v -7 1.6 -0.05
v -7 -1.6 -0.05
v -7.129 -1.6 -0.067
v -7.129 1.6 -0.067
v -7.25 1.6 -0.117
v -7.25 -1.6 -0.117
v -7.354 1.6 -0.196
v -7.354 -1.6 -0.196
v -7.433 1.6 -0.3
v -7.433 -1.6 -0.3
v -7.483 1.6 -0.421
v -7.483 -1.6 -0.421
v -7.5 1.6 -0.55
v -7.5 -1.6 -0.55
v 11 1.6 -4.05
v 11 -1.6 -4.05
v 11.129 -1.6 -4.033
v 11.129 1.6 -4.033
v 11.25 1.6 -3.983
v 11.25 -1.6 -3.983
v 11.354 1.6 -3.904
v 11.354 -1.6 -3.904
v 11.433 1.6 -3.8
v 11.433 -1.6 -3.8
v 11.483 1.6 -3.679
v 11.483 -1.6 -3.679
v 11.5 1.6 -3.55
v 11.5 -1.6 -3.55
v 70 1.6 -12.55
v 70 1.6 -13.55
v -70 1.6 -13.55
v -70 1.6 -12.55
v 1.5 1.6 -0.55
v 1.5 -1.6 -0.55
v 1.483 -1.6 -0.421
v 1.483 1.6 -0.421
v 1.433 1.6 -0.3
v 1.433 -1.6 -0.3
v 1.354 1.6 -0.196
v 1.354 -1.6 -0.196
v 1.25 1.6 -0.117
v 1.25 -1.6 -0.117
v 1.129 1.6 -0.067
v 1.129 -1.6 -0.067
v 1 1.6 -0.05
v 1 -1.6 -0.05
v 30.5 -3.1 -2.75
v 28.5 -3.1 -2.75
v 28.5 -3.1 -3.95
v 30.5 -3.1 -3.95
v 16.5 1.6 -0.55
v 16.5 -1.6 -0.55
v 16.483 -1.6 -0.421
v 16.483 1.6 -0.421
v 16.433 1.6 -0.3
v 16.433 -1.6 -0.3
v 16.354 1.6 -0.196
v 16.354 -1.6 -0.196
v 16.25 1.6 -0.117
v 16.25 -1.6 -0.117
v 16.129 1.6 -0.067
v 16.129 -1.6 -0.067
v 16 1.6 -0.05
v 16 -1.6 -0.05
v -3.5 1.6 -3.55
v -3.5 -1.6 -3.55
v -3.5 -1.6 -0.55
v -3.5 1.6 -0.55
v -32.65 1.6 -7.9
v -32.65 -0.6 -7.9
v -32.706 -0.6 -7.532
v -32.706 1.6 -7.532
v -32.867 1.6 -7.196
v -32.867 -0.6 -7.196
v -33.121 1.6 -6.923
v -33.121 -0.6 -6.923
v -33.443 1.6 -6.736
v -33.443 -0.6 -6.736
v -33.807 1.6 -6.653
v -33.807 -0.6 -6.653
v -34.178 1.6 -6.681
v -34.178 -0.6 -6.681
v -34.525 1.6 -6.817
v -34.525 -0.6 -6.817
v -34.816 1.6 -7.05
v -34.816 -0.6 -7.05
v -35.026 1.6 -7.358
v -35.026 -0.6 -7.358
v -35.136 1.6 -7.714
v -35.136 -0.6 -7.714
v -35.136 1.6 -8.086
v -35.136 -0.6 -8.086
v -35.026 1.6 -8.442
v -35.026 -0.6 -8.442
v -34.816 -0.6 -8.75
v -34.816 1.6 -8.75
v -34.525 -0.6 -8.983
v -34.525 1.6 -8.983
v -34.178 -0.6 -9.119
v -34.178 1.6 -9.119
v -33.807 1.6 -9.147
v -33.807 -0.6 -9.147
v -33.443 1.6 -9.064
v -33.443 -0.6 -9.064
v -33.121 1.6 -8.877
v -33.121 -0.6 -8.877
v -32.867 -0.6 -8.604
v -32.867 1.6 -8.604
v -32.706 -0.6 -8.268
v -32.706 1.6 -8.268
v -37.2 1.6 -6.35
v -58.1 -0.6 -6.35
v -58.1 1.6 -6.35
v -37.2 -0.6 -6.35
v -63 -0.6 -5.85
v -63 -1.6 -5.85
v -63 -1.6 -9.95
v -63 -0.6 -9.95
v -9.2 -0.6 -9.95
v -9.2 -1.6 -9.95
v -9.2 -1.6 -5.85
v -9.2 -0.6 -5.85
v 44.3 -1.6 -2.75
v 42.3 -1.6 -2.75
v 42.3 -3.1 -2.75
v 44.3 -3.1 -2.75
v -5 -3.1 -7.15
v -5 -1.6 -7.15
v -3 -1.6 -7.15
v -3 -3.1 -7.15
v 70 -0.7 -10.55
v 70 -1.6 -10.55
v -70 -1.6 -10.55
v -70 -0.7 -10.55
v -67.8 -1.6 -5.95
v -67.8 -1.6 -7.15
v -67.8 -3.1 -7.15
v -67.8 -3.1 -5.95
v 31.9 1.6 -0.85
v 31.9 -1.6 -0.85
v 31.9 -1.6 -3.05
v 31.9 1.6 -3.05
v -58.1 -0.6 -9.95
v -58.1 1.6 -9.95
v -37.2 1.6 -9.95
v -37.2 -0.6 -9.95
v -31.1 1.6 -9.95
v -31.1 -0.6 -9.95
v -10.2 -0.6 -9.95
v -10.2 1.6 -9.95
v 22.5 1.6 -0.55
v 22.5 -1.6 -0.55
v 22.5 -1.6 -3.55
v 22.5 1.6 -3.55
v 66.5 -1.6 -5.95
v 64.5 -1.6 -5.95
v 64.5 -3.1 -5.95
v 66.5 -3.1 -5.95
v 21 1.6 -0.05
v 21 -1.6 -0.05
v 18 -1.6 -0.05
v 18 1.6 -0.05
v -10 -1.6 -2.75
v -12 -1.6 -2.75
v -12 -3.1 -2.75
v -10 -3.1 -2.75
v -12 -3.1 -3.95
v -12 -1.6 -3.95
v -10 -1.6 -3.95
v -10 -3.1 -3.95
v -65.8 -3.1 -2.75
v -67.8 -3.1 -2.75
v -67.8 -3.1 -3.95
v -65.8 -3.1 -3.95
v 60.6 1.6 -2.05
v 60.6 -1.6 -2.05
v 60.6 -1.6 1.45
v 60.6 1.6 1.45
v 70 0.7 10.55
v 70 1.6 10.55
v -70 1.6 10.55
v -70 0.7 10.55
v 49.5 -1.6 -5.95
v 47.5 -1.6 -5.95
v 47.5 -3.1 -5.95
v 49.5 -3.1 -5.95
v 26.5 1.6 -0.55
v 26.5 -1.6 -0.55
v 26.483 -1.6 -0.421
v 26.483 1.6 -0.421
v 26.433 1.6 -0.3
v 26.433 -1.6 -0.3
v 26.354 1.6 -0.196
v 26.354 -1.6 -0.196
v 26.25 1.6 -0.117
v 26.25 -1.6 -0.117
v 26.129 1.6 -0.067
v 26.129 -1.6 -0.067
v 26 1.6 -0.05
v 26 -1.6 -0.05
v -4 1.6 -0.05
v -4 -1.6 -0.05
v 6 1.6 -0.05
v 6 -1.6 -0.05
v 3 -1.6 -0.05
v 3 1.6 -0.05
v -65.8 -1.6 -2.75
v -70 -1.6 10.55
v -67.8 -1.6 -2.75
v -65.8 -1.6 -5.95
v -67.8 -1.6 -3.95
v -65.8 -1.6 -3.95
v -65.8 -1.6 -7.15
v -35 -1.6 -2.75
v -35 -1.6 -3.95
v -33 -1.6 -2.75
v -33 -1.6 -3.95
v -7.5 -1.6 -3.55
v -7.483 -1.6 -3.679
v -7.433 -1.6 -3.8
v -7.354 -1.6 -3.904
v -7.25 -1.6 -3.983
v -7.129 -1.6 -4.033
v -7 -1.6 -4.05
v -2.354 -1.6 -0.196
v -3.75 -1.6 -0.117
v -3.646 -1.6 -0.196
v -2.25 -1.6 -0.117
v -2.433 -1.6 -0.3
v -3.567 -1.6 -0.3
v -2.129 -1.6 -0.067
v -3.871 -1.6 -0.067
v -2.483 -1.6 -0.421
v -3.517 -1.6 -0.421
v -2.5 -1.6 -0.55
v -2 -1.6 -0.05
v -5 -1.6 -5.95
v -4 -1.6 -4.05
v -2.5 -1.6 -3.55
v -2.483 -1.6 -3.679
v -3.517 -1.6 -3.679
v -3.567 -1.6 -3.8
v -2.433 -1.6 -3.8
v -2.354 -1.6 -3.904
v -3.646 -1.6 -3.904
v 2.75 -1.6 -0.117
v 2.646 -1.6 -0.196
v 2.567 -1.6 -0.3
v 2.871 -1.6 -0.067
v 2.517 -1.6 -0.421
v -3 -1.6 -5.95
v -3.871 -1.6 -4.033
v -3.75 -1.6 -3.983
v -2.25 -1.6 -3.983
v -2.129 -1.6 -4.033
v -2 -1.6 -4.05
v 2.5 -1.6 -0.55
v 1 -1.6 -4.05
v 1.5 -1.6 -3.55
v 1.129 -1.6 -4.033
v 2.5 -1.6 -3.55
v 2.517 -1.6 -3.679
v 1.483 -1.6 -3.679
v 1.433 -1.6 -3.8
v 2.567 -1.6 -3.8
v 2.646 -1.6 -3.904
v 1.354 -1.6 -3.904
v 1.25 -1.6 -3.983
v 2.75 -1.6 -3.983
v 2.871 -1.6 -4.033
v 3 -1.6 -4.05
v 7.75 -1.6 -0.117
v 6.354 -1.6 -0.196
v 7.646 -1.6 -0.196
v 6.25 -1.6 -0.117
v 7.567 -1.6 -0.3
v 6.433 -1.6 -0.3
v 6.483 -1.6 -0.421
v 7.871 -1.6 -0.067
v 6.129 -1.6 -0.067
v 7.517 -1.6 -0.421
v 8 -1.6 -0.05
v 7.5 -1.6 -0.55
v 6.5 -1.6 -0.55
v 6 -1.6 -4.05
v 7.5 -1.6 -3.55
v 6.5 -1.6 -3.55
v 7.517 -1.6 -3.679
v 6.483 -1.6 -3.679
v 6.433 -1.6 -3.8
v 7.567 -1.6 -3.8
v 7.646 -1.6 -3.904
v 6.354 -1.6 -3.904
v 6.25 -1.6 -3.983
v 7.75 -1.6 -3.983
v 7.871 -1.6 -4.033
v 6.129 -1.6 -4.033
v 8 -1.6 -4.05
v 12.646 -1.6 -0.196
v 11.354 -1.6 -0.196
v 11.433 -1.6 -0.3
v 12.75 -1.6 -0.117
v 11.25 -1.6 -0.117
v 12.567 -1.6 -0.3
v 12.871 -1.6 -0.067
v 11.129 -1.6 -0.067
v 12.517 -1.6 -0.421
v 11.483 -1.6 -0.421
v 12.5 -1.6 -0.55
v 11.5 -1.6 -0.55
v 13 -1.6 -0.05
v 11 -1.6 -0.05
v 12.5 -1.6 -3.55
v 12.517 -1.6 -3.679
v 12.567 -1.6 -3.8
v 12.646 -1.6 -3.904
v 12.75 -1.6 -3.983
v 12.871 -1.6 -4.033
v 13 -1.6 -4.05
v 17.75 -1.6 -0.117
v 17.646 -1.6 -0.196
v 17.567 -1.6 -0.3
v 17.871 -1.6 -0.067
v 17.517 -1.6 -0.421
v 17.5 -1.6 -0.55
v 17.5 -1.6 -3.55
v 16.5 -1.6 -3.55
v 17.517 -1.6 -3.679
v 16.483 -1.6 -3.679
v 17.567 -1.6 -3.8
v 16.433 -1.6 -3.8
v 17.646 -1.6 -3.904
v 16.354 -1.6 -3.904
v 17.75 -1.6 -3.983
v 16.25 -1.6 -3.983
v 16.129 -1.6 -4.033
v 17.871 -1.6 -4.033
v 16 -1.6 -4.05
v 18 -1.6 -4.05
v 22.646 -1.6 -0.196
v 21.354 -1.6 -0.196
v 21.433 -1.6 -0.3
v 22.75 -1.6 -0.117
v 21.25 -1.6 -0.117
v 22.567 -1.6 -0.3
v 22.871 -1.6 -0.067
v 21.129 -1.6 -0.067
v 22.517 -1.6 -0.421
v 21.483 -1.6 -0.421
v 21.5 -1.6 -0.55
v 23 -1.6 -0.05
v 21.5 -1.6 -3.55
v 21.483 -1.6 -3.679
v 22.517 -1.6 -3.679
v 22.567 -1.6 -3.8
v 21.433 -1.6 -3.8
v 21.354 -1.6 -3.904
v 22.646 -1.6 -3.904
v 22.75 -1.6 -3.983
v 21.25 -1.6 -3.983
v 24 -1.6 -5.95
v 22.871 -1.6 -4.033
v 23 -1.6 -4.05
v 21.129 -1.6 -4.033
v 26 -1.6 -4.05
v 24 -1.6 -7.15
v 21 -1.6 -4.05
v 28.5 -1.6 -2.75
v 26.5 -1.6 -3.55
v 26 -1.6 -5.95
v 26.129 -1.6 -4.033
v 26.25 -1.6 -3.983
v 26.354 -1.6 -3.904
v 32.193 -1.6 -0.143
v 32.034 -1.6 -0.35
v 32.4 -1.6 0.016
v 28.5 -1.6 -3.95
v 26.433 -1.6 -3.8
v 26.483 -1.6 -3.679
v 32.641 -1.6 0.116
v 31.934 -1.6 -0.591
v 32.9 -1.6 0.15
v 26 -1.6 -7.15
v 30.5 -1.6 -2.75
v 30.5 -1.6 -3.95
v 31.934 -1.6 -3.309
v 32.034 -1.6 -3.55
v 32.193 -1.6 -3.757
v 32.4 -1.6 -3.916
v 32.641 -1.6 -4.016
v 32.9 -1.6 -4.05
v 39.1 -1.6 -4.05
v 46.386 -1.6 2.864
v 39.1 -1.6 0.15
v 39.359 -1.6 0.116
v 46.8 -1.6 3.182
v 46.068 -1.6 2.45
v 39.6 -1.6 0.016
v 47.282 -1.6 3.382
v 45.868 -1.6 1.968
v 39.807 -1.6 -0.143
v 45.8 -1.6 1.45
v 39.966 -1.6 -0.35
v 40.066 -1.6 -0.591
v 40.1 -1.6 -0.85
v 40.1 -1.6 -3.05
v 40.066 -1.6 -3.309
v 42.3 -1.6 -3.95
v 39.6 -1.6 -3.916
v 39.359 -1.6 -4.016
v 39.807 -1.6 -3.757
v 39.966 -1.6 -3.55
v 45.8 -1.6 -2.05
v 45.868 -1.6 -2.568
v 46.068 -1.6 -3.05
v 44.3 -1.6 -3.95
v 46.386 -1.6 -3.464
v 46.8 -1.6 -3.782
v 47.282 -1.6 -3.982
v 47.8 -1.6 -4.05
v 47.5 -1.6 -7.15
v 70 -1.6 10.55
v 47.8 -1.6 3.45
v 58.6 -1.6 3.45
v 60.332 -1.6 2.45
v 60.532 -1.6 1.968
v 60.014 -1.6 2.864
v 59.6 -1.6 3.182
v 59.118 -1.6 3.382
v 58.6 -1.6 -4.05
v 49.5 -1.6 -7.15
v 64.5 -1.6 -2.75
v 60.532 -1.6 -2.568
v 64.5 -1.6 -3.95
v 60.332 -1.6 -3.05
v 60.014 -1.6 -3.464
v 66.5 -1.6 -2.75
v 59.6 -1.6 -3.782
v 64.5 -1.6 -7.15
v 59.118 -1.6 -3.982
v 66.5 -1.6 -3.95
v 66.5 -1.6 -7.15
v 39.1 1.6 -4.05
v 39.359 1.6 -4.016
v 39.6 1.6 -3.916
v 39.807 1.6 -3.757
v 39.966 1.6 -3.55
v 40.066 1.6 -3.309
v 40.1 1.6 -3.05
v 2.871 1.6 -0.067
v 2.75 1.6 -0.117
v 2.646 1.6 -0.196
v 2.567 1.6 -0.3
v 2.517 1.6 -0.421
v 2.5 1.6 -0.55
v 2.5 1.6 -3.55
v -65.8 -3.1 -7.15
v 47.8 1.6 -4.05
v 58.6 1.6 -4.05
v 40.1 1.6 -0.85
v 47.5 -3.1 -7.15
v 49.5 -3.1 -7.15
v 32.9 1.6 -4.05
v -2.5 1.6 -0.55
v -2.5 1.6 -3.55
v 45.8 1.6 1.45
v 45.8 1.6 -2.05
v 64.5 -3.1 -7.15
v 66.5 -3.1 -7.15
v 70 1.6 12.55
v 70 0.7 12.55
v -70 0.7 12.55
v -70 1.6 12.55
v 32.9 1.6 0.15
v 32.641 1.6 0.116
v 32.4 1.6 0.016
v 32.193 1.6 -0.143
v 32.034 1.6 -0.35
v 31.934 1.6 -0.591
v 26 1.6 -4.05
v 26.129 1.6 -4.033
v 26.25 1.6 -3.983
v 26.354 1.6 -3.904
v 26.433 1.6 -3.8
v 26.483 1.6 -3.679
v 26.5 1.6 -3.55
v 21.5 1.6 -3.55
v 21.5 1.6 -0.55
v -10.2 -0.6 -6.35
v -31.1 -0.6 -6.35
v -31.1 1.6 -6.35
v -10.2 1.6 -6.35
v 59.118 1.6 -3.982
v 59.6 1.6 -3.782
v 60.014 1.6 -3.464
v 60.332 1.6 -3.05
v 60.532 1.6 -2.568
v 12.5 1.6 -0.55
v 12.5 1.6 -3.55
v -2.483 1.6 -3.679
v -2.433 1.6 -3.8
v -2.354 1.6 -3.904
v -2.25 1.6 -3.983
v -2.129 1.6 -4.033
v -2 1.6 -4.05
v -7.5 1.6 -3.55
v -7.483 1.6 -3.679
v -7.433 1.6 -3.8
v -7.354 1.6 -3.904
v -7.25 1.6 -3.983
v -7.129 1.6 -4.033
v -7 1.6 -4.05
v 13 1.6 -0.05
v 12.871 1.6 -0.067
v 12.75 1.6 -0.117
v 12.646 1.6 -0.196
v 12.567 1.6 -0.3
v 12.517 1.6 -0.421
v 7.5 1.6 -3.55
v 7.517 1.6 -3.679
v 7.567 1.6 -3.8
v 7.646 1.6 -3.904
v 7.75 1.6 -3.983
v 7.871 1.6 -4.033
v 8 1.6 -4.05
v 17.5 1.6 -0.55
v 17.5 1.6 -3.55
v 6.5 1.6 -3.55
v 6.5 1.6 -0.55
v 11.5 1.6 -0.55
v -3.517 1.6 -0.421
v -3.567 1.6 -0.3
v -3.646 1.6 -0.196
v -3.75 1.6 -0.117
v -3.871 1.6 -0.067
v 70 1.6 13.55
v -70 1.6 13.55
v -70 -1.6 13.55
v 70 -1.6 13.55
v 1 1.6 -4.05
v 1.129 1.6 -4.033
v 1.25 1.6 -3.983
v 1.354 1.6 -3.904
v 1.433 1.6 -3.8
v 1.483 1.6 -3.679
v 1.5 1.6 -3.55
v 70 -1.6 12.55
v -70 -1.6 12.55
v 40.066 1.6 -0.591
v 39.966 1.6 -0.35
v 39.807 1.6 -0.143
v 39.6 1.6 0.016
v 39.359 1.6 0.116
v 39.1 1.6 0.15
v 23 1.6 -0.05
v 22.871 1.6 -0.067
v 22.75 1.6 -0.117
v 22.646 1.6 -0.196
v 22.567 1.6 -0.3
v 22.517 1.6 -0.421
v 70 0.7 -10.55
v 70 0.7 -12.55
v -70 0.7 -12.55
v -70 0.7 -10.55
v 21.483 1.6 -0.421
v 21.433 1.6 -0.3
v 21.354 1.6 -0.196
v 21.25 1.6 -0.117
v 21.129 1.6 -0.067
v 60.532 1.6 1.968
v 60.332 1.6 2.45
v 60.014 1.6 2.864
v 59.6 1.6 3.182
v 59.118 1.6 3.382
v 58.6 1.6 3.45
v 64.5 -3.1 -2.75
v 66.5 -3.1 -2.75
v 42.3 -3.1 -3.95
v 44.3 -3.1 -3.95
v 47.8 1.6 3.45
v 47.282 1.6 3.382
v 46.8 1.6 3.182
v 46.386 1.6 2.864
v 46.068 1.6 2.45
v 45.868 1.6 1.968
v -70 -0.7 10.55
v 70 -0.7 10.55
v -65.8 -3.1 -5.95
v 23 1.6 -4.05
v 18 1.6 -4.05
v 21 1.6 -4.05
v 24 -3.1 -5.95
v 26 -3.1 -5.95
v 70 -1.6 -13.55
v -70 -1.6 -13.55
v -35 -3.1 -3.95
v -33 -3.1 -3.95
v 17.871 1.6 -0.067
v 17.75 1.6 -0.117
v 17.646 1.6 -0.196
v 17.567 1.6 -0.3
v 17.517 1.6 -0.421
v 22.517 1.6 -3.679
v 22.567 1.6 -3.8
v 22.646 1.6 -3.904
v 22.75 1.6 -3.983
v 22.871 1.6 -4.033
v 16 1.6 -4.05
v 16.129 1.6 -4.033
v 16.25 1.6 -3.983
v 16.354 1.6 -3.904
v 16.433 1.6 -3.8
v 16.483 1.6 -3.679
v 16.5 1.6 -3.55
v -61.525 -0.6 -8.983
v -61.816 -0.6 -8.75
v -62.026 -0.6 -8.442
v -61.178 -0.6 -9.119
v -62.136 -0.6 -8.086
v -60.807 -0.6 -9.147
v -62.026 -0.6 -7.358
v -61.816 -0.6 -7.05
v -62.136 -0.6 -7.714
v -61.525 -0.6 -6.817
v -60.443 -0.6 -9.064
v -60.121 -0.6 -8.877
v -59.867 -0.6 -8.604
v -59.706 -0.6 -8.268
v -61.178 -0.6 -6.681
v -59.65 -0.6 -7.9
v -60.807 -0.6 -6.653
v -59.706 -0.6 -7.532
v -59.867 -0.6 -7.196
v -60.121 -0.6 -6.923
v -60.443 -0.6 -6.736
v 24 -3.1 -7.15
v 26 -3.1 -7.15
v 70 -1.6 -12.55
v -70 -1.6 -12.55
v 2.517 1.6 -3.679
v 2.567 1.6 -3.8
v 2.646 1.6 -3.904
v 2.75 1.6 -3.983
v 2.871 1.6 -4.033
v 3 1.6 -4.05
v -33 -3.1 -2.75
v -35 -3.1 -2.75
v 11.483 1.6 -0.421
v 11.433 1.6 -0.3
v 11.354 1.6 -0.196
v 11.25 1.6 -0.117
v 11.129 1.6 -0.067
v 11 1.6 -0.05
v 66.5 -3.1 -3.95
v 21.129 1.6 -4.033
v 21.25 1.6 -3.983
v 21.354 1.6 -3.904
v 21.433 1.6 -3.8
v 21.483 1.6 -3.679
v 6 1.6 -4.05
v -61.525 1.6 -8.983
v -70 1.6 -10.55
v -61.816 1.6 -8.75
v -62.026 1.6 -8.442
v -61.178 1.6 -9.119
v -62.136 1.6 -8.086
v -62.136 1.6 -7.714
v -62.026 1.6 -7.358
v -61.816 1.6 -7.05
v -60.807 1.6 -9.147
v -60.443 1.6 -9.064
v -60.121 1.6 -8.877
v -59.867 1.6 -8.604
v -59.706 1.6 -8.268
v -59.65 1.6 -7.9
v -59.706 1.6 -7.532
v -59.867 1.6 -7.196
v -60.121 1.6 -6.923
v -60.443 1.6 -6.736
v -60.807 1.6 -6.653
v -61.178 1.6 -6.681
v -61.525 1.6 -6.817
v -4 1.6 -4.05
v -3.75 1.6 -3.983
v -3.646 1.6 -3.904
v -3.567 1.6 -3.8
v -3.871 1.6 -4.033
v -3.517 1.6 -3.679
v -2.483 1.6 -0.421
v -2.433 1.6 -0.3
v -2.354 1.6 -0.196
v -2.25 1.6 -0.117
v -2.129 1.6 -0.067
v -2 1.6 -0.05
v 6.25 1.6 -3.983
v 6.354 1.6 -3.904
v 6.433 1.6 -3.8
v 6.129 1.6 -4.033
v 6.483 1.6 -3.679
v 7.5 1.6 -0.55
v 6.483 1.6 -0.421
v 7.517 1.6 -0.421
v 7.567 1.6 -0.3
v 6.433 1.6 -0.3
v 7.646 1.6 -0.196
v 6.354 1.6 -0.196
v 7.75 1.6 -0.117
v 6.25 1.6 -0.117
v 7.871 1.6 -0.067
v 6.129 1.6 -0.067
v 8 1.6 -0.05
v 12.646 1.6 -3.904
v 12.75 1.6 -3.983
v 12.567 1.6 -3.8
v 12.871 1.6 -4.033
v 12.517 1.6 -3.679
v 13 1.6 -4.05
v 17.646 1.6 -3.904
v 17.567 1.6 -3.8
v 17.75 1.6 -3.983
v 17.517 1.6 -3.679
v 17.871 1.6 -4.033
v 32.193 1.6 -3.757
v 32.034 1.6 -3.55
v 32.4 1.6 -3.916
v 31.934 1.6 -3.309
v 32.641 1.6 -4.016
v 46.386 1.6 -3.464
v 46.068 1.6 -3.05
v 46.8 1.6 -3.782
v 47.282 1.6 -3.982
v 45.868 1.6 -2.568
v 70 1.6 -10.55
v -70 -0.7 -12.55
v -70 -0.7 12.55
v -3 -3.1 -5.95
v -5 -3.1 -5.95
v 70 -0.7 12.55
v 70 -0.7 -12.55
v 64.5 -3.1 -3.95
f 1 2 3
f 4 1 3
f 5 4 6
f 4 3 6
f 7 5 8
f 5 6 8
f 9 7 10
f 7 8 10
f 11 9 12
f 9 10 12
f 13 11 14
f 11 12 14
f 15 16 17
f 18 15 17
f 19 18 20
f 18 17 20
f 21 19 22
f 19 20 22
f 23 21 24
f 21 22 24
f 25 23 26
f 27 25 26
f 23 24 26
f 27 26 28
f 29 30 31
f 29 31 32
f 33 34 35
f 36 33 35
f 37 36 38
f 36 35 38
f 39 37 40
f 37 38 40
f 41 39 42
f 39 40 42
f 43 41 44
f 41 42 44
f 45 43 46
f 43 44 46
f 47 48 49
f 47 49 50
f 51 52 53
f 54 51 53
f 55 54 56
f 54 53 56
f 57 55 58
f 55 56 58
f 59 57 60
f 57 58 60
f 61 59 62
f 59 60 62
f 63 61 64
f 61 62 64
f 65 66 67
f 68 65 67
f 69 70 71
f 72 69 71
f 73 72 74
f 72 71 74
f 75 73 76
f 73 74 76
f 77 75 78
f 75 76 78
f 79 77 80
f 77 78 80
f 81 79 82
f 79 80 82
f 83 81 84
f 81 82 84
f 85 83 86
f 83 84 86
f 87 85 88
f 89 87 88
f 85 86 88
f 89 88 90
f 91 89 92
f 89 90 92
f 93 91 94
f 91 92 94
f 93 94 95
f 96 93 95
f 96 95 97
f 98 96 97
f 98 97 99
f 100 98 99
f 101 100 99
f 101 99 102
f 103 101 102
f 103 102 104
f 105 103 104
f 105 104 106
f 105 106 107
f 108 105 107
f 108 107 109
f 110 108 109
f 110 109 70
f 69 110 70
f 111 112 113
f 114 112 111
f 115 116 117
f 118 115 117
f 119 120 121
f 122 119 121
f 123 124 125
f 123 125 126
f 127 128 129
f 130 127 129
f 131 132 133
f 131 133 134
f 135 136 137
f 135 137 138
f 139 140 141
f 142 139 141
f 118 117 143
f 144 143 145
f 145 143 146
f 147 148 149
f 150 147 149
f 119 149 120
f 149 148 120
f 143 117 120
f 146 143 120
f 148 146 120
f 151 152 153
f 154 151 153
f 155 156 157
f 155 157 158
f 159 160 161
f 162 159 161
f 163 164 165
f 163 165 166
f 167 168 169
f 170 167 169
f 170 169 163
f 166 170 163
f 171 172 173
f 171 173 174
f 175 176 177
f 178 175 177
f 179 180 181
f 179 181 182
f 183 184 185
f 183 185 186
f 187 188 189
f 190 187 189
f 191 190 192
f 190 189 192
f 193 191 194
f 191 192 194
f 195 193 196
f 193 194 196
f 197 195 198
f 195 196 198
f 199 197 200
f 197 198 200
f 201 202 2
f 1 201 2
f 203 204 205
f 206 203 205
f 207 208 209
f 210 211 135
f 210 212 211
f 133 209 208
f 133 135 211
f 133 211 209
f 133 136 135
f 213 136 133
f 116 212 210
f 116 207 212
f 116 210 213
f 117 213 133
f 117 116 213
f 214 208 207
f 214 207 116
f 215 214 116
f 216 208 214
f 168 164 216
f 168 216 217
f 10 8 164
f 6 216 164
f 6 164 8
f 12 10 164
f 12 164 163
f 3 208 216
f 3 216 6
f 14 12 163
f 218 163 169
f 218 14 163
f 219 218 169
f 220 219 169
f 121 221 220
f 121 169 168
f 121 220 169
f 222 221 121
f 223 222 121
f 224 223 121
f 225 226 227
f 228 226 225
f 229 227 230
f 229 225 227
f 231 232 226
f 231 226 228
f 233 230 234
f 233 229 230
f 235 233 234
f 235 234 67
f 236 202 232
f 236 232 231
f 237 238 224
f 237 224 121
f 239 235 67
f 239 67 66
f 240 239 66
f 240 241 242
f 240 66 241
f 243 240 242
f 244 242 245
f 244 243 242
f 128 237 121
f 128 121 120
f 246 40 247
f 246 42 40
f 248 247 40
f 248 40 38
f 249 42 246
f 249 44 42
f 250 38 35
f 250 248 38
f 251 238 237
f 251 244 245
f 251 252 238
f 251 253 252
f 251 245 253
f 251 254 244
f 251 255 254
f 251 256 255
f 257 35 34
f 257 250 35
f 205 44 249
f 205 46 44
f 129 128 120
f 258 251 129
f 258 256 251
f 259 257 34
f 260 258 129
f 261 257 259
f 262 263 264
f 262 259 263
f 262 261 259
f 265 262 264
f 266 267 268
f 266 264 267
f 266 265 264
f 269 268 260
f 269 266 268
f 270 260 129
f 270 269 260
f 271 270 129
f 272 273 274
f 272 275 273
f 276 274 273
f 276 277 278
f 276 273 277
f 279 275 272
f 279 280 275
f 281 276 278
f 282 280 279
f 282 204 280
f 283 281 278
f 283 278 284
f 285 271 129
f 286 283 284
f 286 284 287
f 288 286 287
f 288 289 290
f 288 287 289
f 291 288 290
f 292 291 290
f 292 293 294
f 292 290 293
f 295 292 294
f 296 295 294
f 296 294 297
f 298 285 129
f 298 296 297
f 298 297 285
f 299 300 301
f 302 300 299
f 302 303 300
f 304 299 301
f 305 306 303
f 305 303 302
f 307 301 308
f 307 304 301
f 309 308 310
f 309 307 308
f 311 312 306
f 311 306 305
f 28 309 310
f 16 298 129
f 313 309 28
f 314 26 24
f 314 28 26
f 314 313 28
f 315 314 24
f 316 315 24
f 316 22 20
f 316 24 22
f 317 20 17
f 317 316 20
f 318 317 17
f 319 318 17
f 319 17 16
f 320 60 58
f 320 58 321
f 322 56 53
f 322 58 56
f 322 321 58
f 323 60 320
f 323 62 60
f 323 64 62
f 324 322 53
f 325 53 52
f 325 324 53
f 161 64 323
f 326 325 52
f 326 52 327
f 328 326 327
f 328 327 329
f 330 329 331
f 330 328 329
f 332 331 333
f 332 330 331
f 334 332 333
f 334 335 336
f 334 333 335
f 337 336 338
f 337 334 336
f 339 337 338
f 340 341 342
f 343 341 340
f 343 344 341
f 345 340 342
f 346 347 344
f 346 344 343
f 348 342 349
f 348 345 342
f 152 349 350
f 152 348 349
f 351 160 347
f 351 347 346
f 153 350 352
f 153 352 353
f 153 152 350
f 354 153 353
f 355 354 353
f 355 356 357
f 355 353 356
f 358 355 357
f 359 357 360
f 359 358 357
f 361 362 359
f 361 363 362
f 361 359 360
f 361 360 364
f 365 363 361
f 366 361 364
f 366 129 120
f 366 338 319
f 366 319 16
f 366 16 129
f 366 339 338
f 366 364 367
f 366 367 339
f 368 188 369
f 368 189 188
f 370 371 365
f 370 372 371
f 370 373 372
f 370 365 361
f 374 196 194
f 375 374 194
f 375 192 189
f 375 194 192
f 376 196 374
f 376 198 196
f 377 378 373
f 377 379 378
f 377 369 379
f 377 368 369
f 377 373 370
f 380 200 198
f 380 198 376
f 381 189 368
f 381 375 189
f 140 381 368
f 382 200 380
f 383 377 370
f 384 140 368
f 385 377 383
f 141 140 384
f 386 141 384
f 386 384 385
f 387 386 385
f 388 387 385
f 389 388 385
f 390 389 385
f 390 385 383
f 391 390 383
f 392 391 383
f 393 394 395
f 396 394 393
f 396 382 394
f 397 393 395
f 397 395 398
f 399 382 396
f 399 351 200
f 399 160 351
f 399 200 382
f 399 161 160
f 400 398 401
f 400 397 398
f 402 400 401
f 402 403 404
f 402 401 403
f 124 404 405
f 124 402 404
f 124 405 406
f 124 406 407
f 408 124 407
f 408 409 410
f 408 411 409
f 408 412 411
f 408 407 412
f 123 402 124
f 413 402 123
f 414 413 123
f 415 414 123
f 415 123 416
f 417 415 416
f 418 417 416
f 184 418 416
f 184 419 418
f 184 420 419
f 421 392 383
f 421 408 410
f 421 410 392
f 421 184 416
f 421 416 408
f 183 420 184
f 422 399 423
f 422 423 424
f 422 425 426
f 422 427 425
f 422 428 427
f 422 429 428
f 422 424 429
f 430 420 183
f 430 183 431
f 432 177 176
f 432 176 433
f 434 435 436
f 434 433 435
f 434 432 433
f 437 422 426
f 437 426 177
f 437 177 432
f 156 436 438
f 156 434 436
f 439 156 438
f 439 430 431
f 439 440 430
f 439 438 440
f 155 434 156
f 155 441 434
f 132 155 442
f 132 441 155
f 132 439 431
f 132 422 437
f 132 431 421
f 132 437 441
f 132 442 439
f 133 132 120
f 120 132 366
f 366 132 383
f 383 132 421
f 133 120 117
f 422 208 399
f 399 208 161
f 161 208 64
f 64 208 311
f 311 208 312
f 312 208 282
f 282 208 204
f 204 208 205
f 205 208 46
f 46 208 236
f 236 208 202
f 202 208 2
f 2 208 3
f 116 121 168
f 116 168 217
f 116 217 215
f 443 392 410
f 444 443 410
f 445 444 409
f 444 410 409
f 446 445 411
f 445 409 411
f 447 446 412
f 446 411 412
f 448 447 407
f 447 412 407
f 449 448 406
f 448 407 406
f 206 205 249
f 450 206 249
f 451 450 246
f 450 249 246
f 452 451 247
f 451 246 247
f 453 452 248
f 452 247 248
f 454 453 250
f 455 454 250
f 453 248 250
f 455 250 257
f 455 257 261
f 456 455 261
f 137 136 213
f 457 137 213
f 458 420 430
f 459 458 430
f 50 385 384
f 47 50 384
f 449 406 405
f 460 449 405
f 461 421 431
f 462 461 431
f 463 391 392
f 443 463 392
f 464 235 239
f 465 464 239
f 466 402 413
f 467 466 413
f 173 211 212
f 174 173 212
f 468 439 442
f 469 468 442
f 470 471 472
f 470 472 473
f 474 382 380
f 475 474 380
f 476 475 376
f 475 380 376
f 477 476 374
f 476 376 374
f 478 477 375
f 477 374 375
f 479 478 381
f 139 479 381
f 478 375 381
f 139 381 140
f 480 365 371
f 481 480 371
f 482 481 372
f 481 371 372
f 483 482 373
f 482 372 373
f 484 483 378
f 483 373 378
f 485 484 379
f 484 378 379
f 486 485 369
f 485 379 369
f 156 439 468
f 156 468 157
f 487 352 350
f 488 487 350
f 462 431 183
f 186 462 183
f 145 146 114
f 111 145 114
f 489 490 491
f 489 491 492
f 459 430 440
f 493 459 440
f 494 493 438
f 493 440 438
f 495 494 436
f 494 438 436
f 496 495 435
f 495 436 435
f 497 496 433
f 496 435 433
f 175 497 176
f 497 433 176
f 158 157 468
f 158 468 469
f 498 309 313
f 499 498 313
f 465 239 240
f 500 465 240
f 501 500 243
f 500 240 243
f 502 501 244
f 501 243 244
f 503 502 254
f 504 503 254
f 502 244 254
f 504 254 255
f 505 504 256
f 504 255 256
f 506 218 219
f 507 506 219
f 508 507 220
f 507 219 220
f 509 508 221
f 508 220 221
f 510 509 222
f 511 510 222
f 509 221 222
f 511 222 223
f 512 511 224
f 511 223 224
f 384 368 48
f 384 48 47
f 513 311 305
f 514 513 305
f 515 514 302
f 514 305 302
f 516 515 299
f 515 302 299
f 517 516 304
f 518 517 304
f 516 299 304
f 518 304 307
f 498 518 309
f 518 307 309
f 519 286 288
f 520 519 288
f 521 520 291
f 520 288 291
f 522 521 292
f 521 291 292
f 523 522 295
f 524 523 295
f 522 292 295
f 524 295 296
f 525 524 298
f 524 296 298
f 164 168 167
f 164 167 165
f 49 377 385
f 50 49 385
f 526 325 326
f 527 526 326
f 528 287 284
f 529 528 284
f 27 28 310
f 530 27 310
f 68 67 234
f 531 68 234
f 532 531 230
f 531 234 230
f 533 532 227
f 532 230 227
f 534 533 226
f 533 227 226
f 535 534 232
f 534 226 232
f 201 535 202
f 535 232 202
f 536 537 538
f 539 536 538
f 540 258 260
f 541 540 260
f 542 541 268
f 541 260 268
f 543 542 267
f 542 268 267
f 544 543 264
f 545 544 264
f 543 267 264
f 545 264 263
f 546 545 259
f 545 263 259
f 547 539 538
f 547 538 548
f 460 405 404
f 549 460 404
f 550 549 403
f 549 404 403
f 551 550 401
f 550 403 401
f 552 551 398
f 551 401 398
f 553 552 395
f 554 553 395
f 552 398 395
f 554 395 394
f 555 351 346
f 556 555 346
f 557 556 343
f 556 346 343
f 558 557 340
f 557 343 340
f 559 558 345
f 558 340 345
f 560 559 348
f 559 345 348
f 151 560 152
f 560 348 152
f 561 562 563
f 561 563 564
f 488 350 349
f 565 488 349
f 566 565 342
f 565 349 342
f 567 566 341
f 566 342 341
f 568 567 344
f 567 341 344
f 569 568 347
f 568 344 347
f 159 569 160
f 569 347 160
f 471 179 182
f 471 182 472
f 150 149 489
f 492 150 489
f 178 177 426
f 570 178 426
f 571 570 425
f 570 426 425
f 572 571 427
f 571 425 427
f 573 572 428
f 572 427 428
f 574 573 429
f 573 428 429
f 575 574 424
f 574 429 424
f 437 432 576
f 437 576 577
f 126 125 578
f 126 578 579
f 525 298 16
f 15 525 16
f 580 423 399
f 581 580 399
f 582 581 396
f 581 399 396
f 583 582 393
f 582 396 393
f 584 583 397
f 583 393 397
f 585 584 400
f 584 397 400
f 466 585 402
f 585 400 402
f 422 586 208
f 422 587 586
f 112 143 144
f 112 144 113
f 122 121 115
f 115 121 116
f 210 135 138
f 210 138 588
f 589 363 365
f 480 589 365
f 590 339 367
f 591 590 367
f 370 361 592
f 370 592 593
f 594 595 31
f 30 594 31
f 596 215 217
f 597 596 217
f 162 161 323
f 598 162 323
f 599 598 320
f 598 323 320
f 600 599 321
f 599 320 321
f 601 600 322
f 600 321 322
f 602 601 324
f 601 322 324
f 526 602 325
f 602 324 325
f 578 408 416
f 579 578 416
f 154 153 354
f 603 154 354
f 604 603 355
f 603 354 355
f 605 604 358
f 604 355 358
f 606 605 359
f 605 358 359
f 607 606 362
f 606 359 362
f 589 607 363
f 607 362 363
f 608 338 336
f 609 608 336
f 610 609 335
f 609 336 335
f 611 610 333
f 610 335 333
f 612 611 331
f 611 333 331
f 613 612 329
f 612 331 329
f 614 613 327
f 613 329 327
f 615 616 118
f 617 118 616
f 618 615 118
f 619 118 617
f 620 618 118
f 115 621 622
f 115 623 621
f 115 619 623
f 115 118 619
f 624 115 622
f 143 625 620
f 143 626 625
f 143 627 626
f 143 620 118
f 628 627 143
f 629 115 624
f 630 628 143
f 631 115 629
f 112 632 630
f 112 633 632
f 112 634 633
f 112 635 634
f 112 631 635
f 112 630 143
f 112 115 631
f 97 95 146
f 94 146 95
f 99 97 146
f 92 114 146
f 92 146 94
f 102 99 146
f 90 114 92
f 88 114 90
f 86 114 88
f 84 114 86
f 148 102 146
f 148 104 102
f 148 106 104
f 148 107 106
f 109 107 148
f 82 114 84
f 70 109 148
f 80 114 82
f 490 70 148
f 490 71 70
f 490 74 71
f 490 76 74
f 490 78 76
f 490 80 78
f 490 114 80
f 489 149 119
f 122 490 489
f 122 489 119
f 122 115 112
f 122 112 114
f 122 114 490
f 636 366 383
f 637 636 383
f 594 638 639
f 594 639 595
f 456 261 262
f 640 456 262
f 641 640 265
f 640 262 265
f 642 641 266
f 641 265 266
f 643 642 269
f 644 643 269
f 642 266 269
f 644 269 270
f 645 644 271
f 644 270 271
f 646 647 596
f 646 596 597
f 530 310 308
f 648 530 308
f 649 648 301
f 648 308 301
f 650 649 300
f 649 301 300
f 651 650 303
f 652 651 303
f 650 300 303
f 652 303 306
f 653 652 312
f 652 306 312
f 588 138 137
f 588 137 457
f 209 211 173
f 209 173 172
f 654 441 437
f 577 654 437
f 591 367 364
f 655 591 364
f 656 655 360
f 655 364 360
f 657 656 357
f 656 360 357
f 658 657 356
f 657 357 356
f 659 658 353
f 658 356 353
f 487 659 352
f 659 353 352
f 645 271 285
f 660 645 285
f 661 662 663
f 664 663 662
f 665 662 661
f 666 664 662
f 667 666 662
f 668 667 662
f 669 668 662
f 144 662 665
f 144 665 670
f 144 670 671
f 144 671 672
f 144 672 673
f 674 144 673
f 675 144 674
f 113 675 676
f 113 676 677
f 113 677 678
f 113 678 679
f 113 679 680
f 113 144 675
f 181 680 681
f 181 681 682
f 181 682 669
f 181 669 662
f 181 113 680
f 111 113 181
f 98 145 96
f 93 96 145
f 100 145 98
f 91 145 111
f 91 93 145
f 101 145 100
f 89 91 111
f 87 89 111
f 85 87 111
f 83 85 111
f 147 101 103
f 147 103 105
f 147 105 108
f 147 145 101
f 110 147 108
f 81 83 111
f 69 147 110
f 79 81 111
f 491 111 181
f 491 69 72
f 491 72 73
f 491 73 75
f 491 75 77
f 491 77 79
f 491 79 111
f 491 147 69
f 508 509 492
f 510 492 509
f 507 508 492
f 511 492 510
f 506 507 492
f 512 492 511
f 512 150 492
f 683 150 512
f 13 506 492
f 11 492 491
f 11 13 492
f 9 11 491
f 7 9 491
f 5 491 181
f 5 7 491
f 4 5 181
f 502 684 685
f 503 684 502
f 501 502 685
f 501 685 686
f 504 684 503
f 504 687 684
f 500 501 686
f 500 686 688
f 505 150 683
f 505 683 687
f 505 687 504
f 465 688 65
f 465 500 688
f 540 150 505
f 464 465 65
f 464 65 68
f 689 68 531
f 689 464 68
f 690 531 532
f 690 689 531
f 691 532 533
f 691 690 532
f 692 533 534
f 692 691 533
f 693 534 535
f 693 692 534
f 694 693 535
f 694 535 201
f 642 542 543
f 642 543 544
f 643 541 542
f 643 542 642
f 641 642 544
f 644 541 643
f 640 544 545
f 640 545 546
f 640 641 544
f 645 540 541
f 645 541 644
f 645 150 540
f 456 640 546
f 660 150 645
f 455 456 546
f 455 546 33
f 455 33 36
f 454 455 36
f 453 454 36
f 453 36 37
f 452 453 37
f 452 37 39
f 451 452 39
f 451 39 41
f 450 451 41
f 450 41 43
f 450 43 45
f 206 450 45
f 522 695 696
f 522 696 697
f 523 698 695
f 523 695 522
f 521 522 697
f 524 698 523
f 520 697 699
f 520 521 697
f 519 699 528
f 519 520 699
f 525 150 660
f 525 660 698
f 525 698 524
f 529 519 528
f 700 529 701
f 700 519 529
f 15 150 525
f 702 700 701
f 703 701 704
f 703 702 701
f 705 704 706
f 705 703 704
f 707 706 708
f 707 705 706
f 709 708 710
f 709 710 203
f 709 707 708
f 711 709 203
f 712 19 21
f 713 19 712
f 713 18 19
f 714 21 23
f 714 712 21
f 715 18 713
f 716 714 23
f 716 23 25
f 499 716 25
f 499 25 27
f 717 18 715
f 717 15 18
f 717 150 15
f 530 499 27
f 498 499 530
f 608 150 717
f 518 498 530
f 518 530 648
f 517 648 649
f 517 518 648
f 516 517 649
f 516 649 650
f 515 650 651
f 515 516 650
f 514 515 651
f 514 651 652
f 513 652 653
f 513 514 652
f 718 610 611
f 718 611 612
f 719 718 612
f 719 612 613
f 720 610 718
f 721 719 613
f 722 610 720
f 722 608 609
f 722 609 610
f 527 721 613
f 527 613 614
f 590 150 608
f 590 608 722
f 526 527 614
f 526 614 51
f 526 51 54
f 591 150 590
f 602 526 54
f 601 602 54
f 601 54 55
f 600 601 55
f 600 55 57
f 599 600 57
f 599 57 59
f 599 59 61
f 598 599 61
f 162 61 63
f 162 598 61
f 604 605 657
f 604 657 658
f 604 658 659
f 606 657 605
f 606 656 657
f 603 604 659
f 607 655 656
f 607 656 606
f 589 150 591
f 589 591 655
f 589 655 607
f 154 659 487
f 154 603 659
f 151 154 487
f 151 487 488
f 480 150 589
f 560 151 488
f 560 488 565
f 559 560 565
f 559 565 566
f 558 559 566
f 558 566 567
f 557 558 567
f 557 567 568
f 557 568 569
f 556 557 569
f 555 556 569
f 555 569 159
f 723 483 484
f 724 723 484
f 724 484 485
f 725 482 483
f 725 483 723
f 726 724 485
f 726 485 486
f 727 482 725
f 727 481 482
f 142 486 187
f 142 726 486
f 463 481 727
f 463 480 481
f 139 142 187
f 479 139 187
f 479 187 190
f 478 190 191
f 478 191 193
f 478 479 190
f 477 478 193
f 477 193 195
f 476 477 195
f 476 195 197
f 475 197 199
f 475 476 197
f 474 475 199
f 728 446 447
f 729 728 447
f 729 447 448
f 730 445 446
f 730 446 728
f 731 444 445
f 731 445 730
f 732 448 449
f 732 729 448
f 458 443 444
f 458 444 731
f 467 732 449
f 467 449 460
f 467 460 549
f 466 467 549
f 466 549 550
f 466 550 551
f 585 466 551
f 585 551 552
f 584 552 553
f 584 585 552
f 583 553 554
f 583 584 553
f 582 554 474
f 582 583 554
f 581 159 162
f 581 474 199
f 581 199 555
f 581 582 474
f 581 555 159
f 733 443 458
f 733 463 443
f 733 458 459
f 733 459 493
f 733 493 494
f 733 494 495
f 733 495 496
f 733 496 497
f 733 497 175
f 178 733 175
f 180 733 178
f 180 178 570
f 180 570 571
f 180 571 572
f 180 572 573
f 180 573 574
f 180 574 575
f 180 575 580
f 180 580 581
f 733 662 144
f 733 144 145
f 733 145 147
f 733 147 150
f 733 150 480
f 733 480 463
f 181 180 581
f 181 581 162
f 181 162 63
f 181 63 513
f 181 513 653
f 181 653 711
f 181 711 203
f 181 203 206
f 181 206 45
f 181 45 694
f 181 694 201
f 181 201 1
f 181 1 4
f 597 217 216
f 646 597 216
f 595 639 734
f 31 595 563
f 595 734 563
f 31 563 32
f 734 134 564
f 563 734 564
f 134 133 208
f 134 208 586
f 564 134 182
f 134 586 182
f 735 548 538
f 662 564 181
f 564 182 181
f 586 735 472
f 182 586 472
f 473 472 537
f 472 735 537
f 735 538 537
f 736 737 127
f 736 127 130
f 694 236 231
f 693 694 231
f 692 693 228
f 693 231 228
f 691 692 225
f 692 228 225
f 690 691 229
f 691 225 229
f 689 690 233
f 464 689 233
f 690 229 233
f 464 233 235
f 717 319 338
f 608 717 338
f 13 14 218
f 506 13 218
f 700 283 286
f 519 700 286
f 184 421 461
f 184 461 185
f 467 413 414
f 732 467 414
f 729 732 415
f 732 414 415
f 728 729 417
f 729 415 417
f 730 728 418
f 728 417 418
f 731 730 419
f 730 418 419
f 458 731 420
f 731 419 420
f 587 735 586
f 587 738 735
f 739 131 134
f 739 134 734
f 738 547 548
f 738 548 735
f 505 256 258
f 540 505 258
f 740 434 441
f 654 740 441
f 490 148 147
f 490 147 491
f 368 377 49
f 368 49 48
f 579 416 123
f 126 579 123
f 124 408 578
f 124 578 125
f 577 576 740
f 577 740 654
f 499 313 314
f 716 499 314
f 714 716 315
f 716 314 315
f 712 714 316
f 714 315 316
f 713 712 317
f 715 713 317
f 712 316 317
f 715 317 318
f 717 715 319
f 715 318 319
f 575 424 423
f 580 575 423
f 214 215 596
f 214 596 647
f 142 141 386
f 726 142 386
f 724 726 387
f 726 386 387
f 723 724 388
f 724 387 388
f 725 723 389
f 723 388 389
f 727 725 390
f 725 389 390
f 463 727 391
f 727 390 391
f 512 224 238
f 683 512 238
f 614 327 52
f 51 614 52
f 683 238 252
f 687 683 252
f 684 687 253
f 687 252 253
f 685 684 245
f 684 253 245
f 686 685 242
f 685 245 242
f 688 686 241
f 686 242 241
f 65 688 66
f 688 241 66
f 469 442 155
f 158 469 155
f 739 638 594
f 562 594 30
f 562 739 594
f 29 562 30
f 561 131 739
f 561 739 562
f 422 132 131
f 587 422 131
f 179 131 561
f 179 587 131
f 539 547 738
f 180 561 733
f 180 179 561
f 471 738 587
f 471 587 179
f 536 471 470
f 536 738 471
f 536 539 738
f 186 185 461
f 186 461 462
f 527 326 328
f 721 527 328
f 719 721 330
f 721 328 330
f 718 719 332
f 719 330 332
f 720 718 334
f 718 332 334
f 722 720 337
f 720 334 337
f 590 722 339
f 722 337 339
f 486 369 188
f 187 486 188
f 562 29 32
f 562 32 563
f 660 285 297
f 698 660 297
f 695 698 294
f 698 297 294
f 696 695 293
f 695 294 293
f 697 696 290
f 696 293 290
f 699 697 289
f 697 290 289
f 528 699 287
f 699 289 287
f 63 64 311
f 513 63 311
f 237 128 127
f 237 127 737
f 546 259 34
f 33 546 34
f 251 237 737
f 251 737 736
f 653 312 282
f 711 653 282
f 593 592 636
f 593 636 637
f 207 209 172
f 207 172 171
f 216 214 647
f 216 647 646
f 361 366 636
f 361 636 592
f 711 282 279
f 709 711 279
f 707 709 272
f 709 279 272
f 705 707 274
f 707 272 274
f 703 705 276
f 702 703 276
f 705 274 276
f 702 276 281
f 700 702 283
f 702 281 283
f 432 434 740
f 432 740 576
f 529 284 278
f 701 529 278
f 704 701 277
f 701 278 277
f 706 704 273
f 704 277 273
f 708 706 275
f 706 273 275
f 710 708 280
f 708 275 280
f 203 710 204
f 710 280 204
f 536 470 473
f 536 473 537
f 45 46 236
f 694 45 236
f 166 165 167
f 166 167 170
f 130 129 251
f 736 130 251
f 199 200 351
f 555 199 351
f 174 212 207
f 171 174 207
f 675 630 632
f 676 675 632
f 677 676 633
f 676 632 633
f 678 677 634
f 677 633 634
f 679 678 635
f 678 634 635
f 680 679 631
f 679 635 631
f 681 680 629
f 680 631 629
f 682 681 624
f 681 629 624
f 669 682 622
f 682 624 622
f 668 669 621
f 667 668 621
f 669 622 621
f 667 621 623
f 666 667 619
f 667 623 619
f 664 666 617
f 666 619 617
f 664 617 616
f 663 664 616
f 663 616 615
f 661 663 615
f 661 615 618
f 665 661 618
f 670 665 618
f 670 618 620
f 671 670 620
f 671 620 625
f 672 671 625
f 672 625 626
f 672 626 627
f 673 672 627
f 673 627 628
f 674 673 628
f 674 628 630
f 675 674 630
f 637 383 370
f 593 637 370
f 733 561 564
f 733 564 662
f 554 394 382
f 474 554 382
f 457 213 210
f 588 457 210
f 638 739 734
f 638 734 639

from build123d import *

# Parameters (mm, degrees)
F1_DEPTH = 70
F2_R     = 1.25
F2_W     = 20.9
F2_H     = 3.6
F3_DEPTH = 4
F4_DEPTH = 1
F2_W_2   = 2
F2_H_2   = 1.2
F5_DEPTH = 1.5


with BuildPart() as f1:
    # F0 (on Right) → F1 (new body, symmetric)
    with BuildSketch(Plane.YZ):
        Polygon((-1.6, 10.55), (-1.6, 0), (-1.6, -10.55), (-0.7, -10.55), (-0.7, -12.55), (-1.6, -12.55), (-1.6, -13.55), (0, -13.55), (1.6, -13.55), (1.6, -12.55), (0.7, -12.55), (0.7, -10.55), (1.6, -10.55), (1.6, 0), (1.6, 10.55), (0.7, 10.55), (0.7, 12.55), (1.6, 12.55), (1.6, 13.55), (0, 13.55), (-1.6, 13.55), (-1.6, 12.55), (-0.7, 12.55), (-0.7, 10.55), align=None)
    extrude(amount=F1_DEPTH, both=True)

    # F2 (on face) → F3 (cut)
    with BuildSketch(Plane.XZ.offset(1.6)):
        with BuildLine():
            Line((-7, -4.05), (-4, -4.05))
            ThreePointArc((-4, -4.05), (-3.646447, -3.903553), (-3.5, -3.55))
            Line((-3.5, -3.55), (-3.5, -0.55))
            ThreePointArc((-3.5, -0.55), (-3.646447, -0.196447), (-4, -0.05))
            Line((-4, -0.05), (-7, -0.05))
            ThreePointArc((-7, -0.05), (-7.353553, -0.196447), (-7.5, -0.55))
            Line((-7.5, -0.55), (-7.5, -3.55))
            ThreePointArc((-7.5, -3.55), (-7.353553, -3.903553), (-7, -4.05))
        make_face()
        with BuildLine():
            ThreePointArc((1.5, -0.55), (1.353553, -0.196447), (1, -0.05))
            Line((1, -0.05), (-2, -0.05))
            ThreePointArc((-2, -0.05), (-2.353553, -0.196447), (-2.5, -0.55))
            Line((-2.5, -0.55), (-2.5, -3.55))
            ThreePointArc((-2.5, -3.55), (-2.353553, -3.903553), (-2, -4.05))
            Line((-2, -4.05), (1, -4.05))
            ThreePointArc((1, -4.05), (1.353553, -3.903553), (1.5, -3.55))
            Line((1.5, -3.55), (1.5, -0.55))
        make_face()
        with BuildLine():
            ThreePointArc((6.5, -0.55), (6.353553, -0.196447), (6, -0.05))
            Line((6, -0.05), (3, -0.05))
            ThreePointArc((3, -0.05), (2.646447, -0.196447), (2.5, -0.55))
            Line((2.5, -0.55), (2.5, -3.55))
            ThreePointArc((2.5, -3.55), (2.646447, -3.903553), (3, -4.05))
            Line((3, -4.05), (6, -4.05))
            ThreePointArc((6, -4.05), (6.353553, -3.903553), (6.5, -3.55))
            Line((6.5, -3.55), (6.5, -0.55))
        make_face()
        with BuildLine():
            ThreePointArc((11.5, -0.55), (11.353553, -0.196447), (11, -0.05))
            Line((11, -0.05), (8, -0.05))
            ThreePointArc((8, -0.05), (7.646447, -0.196447), (7.5, -0.55))
            Line((7.5, -0.55), (7.5, -3.55))
            ThreePointArc((7.5, -3.55), (7.646447, -3.903553), (8, -4.05))
            Line((8, -4.05), (11, -4.05))
            ThreePointArc((11, -4.05), (11.353553, -3.903553), (11.5, -3.55))
            Line((11.5, -3.55), (11.5, -0.55))
        make_face()
        with BuildLine():
            ThreePointArc((16.5, -0.55), (16.353553, -0.196447), (16, -0.05))
            Line((16, -0.05), (13, -0.05))
            ThreePointArc((13, -0.05), (12.646447, -0.196447), (12.5, -0.55))
            Line((12.5, -0.55), (12.5, -3.55))
            ThreePointArc((12.5, -3.55), (12.646447, -3.903553), (13, -4.05))
            Line((13, -4.05), (16, -4.05))
            ThreePointArc((16, -4.05), (16.353553, -3.903553), (16.5, -3.55))
            Line((16.5, -3.55), (16.5, -0.55))
        make_face()
        with BuildLine():
            ThreePointArc((21.5, -0.55), (21.353553, -0.196447), (21, -0.05))
            Line((21, -0.05), (18, -0.05))
            ThreePointArc((18, -0.05), (17.646447, -0.196447), (17.5, -0.55))
            Line((17.5, -0.55), (17.5, -3.55))
            ThreePointArc((17.5, -3.55), (17.646447, -3.903553), (18, -4.05))
            Line((18, -4.05), (21, -4.05))
            ThreePointArc((21, -4.05), (21.353553, -3.903553), (21.5, -3.55))
            Line((21.5, -3.55), (21.5, -0.55))
        make_face()
        with BuildLine():
            ThreePointArc((26.5, -0.55), (26.353553, -0.196447), (26, -0.05))
            Line((26, -0.05), (23, -0.05))
            ThreePointArc((23, -0.05), (22.646447, -0.196447), (22.5, -0.55))
            Line((22.5, -0.55), (22.5, -3.55))
            ThreePointArc((22.5, -3.55), (22.646447, -3.903553), (23, -4.05))
            Line((23, -4.05), (26, -4.05))
            ThreePointArc((26, -4.05), (26.353553, -3.903553), (26.5, -3.55))
            Line((26.5, -3.55), (26.5, -0.55))
        make_face()
        with BuildLine():
            Line((32.9, -4.05), (39.1, -4.05))
            ThreePointArc((39.1, -4.05), (39.807107, -3.757107), (40.1, -3.05))
            Line((40.1, -3.05), (40.1, -0.85))
            ThreePointArc((40.1, -0.85), (39.807107, -0.142893), (39.1, 0.15))
            Line((39.1, 0.15), (32.9, 0.15))
            ThreePointArc((32.9, 0.15), (32.192893, -0.142893), (31.9, -0.85))
            Line((31.9, -0.85), (31.9, -3.05))
            ThreePointArc((31.9, -3.05), (32.192893, -3.757107), (32.9, -4.05))
        make_face()
        with BuildLine():
            Line((47.8, -4.05), (58.6, -4.05))
            ThreePointArc((58.6, -4.05), (60.014214, -3.464214), (60.6, -2.05))
            Line((60.6, -2.05), (60.6, 1.45))
            ThreePointArc((60.6, 1.45), (60.014214, 2.864214), (58.6, 3.45))
            Line((58.6, 3.45), (47.8, 3.45))
            ThreePointArc((47.8, 3.45), (46.385786, 2.864214), (45.8, 1.45))
            Line((45.8, 1.45), (45.8, -2.05))
            ThreePointArc((45.8, -2.05), (46.385786, -3.464214), (47.8, -4.05))
        make_face()
        with Locations((-33.9, -7.9)):
            Circle(F2_R)
        with Locations((-20.65, -8.15)):
            Rectangle(F2_W, F2_H)
        with Locations((-47.65, -8.15)):
            Rectangle(F2_W, F2_H)
        with Locations((-60.9, -7.9)):
            Circle(F2_R)
    extrude(amount=-F3_DEPTH, mode=Mode.SUBTRACT)

    # F2 (on face) → F4 (cut)
    with BuildSketch(Plane.XZ.offset(1.6)):
        Polygon((-10.2, -9.95), (-9.2, -9.95), (-9.2, -5.85), (-63, -5.85), (-63, -9.95), (-58.1, -9.95), (-58.1, -6.35), (-37.2, -6.35), (-37.2, -9.95), (-31.1, -9.95), (-31.1, -6.35), (-10.2, -6.35), align=None)
        with Locations((-60.9, -7.9)):
            Circle(F2_R, mode=Mode.SUBTRACT)
        with Locations((-33.9, -7.9)):
            Circle(F2_R, mode=Mode.SUBTRACT)
    extrude(amount=-F4_DEPTH, mode=Mode.SUBTRACT)

    # F2 (on face) → F5 (join)
    with BuildSketch(Plane.XZ.offset(1.6)):
        with Locations((-66.8, -3.35)):
            Rectangle(F2_W_2, F2_H_2)
        with Locations((-66.8, -6.55)):
            Rectangle(F2_W_2, F2_H_2)
        with Locations((-34, -3.35)):
            Rectangle(F2_W_2, F2_H_2)
        with Locations((-11, -3.35)):
            Rectangle(F2_W_2, F2_H_2)
        with Locations((-4, -6.55)):
            Rectangle(F2_W_2, F2_H_2)
        with Locations((25, -6.55)):
            Rectangle(F2_W_2, F2_H_2)
        with Locations((29.5, -3.35)):
            Rectangle(F2_W_2, F2_H_2)
        with Locations((43.3, -3.35)):
            Rectangle(F2_W_2, F2_H_2)
        with Locations((48.5, -6.55)):
            Rectangle(F2_W_2, F2_H_2)
        with Locations((65.5, -3.35)):
            Rectangle(F2_W_2, F2_H_2)
        with Locations((65.5, -6.55)):
            Rectangle(F2_W_2, F2_H_2)
    extrude(amount=F5_DEPTH)


solid = f1.part
